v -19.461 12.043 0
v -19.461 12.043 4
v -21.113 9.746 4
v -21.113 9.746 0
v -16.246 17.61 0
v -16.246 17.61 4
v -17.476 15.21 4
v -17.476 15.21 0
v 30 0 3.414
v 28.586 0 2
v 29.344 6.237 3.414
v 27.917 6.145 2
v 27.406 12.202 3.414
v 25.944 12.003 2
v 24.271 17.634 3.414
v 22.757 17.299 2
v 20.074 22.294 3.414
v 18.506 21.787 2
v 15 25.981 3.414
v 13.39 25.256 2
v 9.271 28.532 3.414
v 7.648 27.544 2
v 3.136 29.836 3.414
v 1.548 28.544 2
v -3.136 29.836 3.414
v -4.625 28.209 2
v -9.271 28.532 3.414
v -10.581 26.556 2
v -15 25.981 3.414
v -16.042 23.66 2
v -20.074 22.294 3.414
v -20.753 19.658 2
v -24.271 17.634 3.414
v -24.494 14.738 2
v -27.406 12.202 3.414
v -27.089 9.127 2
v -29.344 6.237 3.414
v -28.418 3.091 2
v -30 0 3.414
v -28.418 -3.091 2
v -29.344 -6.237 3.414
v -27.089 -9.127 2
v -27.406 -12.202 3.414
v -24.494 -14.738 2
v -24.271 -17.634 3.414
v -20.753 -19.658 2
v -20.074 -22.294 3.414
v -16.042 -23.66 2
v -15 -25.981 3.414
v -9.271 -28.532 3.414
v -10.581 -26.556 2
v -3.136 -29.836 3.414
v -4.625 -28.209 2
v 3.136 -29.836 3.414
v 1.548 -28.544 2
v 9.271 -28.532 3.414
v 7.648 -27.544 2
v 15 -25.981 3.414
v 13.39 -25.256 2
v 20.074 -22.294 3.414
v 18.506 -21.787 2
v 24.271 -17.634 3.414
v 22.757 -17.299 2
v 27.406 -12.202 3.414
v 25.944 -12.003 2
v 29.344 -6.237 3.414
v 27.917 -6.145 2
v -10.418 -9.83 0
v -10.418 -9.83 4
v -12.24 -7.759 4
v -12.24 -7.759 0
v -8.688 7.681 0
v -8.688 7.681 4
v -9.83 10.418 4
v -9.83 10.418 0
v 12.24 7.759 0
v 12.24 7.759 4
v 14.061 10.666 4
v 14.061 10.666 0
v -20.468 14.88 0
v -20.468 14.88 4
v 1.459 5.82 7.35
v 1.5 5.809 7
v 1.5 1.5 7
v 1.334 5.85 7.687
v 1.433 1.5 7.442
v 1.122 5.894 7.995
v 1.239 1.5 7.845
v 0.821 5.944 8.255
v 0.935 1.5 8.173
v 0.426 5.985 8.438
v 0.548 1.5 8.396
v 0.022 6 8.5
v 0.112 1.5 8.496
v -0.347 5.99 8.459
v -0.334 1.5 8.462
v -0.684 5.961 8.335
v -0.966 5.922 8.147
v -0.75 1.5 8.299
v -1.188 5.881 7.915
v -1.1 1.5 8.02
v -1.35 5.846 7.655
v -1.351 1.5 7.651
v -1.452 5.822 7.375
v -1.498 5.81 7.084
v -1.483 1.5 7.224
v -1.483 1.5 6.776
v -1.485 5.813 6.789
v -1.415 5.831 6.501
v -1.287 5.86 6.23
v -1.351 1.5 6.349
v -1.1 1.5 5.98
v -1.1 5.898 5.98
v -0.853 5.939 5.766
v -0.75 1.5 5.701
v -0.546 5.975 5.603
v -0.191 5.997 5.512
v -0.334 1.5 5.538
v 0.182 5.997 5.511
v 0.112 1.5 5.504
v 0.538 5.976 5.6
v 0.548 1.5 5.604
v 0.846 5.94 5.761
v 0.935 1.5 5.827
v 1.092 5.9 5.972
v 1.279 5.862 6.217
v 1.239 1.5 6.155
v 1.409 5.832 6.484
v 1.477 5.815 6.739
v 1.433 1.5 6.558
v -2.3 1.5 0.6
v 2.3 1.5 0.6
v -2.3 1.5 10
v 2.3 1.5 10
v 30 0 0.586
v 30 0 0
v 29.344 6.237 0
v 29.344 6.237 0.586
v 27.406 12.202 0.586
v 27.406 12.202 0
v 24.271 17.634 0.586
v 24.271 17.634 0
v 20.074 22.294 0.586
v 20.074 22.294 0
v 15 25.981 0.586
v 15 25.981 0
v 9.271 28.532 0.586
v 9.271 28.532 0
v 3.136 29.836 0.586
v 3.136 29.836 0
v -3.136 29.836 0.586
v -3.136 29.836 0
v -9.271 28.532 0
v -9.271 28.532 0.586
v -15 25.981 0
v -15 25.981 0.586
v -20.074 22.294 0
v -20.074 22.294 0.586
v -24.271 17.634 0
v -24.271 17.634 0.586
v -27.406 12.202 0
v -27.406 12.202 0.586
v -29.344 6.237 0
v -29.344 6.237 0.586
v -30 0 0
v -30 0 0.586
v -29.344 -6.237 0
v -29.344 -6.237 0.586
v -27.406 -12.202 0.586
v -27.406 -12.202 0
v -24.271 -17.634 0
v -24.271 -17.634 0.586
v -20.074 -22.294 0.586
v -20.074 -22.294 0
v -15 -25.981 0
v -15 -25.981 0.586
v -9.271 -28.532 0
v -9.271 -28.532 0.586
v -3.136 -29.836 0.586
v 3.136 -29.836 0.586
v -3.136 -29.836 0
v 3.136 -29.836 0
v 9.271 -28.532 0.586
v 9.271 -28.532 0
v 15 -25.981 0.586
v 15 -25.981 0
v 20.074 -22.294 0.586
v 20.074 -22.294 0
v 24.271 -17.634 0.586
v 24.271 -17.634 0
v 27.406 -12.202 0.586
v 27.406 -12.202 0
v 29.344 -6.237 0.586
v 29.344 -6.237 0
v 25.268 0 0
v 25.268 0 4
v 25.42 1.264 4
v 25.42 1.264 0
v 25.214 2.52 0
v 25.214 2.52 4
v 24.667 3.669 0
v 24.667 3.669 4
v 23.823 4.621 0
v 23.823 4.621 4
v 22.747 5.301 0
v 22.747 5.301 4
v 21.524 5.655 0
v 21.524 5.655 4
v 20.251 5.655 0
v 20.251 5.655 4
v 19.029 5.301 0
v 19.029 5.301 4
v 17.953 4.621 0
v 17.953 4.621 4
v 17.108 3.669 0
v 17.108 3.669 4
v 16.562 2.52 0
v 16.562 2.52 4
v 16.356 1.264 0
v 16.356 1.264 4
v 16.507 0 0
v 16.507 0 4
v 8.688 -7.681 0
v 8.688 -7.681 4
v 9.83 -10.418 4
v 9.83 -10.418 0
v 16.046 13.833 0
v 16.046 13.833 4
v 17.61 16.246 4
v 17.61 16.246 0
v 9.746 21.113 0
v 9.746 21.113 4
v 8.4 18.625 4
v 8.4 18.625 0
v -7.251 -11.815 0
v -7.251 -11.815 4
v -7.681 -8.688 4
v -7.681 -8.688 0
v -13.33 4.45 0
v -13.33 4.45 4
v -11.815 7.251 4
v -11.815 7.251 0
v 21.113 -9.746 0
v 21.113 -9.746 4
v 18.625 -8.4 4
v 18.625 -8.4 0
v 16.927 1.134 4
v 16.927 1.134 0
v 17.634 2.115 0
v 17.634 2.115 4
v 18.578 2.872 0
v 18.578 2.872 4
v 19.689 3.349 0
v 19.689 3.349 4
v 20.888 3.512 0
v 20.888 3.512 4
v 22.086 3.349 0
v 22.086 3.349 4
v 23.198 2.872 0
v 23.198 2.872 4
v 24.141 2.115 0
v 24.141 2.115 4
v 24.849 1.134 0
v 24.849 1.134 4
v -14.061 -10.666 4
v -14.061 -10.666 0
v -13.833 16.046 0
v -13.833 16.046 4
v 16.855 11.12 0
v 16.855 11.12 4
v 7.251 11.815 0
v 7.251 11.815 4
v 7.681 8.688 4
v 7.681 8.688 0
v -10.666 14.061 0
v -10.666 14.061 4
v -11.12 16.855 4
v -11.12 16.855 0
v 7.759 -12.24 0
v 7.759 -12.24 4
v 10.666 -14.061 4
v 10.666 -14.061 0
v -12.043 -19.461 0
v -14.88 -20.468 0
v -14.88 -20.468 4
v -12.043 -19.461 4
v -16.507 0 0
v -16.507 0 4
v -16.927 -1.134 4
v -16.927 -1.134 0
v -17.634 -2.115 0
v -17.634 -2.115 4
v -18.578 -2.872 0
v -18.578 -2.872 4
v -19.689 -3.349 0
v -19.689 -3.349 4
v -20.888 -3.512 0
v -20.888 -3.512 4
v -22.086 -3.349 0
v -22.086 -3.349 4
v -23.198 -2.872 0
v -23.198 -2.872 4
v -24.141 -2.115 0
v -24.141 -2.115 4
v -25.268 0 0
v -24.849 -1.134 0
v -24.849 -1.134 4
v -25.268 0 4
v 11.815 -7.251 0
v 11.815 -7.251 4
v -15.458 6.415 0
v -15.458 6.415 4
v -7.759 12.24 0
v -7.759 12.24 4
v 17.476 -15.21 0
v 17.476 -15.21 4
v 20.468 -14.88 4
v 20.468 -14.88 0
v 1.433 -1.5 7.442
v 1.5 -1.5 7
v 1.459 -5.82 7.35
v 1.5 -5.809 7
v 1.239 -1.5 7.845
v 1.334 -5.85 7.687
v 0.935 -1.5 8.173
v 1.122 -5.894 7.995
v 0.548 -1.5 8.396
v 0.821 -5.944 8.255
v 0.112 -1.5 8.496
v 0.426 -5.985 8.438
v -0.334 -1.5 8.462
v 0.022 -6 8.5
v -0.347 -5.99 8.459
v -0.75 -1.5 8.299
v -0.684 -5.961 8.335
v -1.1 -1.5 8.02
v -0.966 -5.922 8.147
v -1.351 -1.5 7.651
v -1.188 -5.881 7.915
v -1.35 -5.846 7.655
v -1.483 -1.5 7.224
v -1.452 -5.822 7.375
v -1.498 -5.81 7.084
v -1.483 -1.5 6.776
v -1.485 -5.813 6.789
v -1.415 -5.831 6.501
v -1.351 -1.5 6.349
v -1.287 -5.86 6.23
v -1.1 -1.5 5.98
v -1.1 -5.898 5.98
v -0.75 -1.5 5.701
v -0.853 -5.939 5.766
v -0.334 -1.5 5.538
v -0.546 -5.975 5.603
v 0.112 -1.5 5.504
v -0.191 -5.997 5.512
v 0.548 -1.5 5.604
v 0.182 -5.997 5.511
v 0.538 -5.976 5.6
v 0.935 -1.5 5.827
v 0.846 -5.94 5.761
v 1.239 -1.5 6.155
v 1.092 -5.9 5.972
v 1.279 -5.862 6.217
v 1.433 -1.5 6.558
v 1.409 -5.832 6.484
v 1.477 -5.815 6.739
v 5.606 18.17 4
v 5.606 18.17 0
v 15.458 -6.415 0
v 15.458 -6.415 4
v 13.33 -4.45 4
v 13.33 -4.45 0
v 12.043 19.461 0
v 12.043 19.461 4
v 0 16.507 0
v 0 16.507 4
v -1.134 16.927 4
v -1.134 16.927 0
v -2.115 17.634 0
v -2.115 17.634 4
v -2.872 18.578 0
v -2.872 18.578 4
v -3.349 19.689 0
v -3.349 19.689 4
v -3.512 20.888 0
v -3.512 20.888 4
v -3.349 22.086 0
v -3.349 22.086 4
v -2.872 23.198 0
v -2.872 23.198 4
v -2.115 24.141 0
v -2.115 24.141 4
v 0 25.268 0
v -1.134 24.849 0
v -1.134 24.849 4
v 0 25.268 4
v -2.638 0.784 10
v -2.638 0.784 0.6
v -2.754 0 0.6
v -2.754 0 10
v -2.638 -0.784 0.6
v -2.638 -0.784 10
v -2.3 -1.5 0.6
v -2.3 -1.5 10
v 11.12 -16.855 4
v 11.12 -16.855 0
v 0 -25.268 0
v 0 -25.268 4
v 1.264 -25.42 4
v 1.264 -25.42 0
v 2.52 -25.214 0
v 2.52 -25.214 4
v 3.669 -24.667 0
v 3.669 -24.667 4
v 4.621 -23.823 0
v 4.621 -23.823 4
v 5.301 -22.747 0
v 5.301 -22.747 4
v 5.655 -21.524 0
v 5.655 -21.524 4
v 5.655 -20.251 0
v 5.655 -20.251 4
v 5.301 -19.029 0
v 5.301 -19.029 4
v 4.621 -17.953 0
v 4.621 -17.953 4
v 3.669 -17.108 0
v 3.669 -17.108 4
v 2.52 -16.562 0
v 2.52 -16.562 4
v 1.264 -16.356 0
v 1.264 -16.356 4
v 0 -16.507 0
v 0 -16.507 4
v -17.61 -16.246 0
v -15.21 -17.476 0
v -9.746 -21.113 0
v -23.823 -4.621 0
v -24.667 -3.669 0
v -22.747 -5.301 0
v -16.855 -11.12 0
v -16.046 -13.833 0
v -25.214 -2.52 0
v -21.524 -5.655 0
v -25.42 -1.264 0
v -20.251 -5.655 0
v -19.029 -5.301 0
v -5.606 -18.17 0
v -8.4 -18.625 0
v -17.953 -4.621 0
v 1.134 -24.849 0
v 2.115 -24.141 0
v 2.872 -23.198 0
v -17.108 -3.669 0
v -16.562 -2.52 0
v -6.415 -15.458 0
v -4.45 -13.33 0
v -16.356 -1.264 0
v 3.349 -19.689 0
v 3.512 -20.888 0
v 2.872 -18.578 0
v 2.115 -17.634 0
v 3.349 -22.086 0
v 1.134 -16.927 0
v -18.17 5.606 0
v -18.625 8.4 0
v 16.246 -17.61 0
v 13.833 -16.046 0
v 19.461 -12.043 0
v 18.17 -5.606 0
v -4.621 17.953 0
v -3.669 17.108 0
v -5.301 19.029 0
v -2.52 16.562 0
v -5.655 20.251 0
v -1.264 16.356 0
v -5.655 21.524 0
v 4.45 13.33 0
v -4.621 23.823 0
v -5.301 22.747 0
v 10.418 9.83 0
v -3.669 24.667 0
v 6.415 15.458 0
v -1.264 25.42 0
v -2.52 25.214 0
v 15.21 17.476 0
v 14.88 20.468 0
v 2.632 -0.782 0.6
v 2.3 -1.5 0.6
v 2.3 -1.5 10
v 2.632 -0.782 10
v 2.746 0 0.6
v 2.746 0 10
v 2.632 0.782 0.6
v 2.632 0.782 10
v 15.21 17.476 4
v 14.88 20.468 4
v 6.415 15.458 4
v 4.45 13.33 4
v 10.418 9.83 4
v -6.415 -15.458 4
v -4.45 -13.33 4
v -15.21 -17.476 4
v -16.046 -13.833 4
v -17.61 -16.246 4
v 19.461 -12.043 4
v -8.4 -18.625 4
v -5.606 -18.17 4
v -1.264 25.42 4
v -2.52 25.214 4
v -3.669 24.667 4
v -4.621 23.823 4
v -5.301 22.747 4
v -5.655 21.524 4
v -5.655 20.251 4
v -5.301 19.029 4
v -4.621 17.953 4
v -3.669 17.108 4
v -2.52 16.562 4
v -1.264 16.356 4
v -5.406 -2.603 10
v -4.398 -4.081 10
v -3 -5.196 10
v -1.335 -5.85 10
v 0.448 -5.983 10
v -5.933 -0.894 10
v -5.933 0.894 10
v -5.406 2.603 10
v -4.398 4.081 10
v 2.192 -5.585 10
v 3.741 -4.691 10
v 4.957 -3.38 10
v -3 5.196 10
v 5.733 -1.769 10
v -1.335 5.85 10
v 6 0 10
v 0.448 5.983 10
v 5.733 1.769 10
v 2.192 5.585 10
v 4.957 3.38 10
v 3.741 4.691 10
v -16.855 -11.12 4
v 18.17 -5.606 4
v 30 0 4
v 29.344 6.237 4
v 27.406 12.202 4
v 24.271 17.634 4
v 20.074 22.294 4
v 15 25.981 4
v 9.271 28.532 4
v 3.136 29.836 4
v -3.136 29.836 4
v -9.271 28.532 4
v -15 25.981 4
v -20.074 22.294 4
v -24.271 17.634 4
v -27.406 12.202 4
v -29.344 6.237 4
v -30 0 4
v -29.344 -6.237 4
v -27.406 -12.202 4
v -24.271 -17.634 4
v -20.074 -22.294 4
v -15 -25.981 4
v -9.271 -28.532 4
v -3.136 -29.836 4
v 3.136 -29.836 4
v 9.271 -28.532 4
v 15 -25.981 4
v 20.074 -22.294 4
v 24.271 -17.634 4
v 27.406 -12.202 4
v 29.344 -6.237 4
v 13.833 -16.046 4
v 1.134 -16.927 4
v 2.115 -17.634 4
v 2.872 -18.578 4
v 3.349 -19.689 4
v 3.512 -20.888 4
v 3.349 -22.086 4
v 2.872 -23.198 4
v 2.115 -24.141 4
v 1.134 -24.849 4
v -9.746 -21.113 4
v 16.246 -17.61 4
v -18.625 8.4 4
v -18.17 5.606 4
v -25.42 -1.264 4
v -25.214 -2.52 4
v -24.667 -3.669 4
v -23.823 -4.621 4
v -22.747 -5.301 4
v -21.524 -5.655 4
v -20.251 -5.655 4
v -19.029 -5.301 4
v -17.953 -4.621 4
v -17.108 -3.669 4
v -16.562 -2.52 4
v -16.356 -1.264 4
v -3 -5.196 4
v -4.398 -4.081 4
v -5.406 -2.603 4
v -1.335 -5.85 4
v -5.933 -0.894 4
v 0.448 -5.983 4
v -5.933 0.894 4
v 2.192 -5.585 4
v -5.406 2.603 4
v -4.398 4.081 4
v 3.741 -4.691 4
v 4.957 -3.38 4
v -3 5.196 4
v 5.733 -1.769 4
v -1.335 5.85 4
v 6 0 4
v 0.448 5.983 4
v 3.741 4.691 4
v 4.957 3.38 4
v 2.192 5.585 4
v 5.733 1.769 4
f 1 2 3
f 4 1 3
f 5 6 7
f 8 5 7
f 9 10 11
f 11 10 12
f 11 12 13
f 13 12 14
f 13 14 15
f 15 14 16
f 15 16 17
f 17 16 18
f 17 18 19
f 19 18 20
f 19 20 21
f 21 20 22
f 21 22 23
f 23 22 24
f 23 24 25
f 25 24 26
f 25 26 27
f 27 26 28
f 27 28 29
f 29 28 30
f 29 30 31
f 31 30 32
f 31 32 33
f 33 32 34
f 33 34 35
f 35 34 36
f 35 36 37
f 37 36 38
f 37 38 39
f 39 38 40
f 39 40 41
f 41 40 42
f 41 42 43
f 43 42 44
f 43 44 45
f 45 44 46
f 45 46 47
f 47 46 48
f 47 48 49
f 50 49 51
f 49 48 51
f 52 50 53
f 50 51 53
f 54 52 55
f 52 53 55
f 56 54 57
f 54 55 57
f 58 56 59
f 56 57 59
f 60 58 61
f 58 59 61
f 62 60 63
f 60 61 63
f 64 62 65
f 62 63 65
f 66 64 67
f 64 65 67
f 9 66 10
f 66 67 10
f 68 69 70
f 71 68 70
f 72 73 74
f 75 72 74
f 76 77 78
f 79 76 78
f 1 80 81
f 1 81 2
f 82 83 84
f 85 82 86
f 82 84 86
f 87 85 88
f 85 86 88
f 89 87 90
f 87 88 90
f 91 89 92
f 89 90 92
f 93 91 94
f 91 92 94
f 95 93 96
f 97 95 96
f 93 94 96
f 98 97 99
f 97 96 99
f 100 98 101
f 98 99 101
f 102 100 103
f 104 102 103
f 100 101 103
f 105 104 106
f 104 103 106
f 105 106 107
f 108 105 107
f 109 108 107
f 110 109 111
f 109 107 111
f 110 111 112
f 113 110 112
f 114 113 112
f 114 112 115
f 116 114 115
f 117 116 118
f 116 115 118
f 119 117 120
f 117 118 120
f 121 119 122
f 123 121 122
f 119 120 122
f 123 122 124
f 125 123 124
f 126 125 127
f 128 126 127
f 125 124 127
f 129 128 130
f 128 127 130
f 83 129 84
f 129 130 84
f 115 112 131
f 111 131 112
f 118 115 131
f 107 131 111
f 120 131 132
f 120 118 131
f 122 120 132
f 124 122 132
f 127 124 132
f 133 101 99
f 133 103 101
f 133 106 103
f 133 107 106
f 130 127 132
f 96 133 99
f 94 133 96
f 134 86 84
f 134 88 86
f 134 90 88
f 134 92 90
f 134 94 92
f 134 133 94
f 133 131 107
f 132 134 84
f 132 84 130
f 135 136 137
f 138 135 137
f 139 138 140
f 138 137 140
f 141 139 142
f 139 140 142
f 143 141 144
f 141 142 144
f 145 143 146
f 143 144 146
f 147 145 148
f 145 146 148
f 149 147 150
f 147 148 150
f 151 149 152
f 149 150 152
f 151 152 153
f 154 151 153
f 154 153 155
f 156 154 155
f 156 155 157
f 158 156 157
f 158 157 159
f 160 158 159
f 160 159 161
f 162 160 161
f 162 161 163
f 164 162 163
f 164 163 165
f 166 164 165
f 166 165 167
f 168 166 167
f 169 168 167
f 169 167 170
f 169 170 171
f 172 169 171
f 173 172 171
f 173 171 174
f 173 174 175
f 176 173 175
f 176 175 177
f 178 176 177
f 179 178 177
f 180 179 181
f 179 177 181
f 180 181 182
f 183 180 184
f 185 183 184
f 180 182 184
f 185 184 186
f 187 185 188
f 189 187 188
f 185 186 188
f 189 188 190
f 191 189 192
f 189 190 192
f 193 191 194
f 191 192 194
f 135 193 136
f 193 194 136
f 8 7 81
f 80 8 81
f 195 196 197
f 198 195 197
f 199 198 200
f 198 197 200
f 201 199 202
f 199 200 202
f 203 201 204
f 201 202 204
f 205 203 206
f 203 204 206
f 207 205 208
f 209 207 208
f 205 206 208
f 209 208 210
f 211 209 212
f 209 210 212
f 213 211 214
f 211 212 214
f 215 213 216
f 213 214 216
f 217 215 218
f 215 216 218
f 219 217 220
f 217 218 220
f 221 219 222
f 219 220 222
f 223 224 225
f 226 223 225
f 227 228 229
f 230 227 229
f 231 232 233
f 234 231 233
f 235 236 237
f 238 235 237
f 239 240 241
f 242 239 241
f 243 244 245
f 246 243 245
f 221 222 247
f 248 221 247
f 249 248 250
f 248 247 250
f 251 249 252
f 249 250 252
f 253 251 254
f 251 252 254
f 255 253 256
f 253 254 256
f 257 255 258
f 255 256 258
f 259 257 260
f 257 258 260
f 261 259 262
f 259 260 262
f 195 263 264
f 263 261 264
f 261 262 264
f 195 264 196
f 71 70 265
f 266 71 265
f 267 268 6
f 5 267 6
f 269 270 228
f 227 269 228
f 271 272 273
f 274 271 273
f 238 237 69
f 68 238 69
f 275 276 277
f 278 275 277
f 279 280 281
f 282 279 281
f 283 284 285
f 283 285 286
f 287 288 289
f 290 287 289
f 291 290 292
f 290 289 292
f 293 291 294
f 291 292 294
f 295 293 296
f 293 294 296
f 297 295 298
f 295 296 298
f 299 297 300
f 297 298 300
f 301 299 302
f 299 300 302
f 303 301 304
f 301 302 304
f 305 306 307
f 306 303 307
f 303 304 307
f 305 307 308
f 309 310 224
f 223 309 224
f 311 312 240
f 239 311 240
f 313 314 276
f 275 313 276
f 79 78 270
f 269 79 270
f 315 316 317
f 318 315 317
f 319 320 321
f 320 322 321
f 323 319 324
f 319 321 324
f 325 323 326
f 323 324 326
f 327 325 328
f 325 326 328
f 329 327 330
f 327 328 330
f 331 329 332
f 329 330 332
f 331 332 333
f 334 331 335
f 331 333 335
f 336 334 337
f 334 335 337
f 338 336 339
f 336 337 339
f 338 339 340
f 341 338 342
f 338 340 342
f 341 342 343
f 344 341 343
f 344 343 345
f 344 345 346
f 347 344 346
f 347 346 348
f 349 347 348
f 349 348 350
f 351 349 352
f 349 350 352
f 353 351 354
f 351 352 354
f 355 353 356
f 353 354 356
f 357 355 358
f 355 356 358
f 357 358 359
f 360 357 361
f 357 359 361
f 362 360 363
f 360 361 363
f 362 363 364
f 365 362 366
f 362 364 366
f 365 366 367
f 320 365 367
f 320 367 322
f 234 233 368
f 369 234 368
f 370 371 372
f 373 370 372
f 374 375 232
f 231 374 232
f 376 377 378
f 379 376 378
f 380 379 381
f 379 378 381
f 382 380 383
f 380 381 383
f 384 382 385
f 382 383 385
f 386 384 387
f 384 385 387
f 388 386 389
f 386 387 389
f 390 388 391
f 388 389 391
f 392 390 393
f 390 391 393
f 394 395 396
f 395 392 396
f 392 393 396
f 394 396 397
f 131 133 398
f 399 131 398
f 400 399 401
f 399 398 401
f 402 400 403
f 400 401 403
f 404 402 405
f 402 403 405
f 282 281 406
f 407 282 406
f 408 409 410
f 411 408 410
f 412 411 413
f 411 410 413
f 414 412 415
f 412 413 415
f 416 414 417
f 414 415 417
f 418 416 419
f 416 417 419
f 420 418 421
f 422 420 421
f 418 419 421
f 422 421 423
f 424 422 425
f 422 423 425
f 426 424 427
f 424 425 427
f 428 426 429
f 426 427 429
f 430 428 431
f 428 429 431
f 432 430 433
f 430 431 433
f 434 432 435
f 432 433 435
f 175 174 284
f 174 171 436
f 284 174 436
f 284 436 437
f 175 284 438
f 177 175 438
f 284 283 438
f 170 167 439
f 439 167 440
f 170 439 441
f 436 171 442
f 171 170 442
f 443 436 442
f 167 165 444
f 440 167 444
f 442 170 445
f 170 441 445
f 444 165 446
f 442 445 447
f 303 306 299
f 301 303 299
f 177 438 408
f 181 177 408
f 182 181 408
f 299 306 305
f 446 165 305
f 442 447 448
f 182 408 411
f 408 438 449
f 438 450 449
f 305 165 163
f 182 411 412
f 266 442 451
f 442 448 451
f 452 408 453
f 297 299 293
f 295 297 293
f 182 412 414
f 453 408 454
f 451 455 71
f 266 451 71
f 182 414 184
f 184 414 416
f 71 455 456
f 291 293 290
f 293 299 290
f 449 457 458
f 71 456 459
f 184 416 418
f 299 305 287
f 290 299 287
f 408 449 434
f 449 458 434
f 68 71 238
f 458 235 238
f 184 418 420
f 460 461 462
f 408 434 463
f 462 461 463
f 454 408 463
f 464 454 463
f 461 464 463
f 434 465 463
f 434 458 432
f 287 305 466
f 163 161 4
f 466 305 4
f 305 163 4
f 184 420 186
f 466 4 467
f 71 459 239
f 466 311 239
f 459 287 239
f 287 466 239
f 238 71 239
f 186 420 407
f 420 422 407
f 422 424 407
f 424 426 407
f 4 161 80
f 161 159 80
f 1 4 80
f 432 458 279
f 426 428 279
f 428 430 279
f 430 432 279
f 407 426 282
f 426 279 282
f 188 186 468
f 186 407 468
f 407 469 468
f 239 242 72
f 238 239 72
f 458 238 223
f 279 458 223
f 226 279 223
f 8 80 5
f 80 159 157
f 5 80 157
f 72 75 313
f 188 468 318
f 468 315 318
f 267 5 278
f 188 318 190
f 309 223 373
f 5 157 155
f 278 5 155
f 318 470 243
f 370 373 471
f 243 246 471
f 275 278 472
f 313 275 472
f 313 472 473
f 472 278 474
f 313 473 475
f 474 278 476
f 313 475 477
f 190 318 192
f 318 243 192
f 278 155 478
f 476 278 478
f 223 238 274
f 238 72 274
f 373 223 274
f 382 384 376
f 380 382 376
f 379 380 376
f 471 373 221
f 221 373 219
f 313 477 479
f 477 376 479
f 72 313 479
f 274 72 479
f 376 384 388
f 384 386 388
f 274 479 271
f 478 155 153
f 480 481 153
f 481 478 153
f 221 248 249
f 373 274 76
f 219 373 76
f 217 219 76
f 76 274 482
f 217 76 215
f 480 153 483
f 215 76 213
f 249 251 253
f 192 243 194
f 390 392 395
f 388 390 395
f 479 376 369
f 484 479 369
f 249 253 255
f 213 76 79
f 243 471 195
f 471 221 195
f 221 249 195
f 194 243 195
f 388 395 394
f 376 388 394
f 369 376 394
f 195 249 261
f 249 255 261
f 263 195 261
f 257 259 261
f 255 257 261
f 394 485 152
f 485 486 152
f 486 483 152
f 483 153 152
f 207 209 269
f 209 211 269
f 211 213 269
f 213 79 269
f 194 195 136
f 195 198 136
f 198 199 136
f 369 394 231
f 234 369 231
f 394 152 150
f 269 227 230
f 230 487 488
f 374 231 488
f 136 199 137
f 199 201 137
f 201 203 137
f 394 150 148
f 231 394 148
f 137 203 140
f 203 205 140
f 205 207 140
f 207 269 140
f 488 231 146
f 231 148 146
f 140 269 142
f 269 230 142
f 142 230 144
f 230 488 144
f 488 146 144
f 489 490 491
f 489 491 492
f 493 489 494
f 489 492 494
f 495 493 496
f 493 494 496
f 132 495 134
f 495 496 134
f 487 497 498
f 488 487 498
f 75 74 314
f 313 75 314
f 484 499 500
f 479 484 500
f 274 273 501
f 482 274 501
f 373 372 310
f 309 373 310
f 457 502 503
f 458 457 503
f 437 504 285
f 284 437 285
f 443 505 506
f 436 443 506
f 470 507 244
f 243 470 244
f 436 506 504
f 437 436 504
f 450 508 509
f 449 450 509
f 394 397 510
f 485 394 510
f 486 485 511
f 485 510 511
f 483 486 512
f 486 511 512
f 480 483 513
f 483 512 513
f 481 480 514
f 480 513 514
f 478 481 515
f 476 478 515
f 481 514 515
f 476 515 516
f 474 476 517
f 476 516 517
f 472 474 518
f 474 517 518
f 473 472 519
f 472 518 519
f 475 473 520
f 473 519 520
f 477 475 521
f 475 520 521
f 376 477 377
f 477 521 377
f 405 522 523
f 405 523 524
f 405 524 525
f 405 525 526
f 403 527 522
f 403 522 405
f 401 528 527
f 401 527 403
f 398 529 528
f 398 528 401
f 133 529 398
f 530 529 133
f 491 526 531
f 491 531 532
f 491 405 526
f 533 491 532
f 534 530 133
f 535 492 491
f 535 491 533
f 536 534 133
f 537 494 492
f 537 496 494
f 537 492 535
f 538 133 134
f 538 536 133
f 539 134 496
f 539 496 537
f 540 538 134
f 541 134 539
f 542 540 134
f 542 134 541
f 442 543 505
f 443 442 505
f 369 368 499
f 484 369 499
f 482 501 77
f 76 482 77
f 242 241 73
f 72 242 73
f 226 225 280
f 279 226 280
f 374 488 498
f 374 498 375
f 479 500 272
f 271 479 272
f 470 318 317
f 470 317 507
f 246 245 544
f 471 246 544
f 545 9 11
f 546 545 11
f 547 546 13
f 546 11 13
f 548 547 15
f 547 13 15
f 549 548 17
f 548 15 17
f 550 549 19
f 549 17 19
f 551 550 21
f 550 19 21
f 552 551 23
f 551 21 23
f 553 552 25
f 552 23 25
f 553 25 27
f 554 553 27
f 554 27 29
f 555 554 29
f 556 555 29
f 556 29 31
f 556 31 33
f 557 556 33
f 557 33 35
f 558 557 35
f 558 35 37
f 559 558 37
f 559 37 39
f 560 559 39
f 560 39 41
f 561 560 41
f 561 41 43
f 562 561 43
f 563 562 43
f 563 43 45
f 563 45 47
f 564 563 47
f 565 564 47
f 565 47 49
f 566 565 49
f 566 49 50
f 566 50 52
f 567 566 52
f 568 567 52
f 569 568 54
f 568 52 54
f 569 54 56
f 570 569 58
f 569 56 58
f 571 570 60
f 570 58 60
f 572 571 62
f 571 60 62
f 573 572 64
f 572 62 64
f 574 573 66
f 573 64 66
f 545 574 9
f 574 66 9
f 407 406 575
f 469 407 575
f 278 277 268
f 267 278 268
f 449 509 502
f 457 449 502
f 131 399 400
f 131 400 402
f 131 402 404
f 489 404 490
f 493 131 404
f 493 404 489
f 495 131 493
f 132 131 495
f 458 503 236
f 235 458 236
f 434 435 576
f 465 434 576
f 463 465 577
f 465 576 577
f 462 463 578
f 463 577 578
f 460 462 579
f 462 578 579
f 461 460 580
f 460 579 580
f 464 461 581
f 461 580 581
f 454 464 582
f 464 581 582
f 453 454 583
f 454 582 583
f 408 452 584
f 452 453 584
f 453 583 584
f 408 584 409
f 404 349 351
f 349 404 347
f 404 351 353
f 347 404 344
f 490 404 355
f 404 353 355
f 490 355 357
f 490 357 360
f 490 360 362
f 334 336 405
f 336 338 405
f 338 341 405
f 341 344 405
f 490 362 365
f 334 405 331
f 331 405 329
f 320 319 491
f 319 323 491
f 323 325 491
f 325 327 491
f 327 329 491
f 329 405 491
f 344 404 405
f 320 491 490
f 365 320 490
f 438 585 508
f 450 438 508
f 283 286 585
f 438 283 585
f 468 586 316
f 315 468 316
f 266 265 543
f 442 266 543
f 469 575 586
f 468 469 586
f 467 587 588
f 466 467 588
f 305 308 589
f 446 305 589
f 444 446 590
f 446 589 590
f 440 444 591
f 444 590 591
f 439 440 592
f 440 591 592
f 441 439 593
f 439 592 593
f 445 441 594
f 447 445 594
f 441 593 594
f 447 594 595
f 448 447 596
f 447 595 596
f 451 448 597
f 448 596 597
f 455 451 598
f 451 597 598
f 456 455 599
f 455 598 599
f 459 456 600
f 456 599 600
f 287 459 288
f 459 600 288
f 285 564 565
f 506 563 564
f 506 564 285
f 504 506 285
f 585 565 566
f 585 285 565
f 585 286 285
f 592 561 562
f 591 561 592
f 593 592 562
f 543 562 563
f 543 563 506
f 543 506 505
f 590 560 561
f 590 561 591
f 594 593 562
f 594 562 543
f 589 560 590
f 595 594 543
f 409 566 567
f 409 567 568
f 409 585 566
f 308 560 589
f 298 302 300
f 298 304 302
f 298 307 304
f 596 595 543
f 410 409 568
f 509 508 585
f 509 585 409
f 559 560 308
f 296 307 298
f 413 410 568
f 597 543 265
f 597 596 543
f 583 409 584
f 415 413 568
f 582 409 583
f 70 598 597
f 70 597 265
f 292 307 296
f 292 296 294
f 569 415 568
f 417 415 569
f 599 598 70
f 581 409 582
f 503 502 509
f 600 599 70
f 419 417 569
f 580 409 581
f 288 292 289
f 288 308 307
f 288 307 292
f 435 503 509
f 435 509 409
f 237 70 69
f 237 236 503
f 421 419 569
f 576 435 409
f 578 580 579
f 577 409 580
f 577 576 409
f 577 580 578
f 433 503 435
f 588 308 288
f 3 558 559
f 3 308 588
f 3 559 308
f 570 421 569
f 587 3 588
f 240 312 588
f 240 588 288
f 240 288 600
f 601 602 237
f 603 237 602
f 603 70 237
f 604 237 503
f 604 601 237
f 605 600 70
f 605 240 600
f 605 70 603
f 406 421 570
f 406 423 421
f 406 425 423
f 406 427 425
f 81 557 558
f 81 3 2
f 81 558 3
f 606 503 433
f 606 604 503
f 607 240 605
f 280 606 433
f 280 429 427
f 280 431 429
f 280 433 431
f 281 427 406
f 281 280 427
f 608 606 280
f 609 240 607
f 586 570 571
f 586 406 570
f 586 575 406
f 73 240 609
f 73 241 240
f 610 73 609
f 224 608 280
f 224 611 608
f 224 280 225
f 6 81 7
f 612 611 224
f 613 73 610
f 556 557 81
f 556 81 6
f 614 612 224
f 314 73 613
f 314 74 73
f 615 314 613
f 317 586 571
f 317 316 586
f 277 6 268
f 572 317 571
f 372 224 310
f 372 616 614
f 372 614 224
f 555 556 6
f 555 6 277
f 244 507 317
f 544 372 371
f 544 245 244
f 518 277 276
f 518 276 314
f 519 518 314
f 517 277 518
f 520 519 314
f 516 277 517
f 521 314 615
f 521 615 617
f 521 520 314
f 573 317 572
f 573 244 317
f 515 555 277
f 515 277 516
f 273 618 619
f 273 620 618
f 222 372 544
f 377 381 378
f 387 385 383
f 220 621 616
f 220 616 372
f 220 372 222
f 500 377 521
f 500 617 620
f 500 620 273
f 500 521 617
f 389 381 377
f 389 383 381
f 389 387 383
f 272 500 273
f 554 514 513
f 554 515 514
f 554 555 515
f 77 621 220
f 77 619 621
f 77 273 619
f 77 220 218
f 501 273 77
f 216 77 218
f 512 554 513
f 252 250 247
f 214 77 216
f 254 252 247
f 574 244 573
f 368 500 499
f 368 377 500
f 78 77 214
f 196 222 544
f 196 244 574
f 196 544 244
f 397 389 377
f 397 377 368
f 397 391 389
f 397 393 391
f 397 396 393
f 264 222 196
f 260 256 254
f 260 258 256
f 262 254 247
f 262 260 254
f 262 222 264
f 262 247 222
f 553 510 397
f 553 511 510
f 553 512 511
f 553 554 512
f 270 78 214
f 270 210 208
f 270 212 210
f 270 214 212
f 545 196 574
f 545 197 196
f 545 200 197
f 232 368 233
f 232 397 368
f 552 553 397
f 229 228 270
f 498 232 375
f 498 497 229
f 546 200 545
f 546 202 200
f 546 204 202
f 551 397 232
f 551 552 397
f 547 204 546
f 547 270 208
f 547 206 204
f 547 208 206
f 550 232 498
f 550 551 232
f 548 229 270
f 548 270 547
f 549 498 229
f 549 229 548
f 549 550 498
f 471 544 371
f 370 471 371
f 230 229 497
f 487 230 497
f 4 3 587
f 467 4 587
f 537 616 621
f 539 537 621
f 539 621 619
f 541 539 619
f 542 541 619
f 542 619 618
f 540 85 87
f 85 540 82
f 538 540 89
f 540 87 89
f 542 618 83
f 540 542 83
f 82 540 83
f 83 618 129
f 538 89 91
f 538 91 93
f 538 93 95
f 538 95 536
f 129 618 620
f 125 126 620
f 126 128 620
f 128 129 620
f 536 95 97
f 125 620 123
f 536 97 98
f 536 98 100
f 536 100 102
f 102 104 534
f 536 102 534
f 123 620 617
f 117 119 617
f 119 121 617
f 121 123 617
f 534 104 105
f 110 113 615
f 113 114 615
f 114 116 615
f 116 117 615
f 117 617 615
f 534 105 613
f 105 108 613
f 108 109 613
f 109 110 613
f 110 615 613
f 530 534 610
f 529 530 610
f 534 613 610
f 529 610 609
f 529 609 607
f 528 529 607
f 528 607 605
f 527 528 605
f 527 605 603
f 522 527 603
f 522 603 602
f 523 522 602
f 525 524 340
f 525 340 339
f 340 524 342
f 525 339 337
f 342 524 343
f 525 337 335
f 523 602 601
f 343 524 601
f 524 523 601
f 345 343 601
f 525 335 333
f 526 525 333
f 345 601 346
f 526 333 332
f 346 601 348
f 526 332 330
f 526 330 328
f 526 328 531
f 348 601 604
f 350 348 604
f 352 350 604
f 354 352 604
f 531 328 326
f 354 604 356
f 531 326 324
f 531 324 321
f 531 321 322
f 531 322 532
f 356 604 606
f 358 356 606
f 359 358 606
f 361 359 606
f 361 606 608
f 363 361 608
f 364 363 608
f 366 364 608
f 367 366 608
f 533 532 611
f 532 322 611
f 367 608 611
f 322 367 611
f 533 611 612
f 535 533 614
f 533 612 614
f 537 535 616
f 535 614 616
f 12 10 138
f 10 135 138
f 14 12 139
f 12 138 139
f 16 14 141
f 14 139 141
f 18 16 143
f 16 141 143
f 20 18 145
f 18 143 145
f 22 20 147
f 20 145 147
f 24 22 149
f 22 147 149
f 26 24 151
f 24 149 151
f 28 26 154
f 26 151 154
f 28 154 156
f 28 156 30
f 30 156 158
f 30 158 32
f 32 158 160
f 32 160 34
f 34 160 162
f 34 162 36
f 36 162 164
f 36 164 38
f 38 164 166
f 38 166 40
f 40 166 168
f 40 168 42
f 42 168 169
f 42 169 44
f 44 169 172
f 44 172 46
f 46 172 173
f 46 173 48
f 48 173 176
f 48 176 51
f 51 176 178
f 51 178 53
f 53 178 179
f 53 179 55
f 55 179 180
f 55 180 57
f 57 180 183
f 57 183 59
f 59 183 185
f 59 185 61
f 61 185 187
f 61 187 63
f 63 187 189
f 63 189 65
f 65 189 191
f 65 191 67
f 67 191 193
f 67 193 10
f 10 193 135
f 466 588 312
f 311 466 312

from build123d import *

# Parameters (mm, degrees)
F0_R      = 30
F1_DEPTH  = 4
F2_R      = 6
F3_DEPTH  = 6
F4_R      = 1.5
F5_DEPTH  = 9.95
F6_W      = 4.6
F6_H      = 3
F7_DEPTH  = 9.4
F9_DEPTH  = 25
F11_DEPTH = 25


with BuildPart() as f1:
    # F0 (on Top) → F1 (new body)
    with BuildSketch(Plane.XY):
        Circle(F0_R)
    extrude(amount=F1_DEPTH)

    # F2 (on face) → F3 (join)
    with BuildSketch(Plane.XY.offset(4)):
        Circle(F2_R)
    extrude(amount=F3_DEPTH)

    # F4 (on Front) → F5 (cut, symmetric)
    with BuildSketch(Plane.XZ):
        with Locations((0, 7)):
            Circle(F4_R)
    extrude(amount=F5_DEPTH, both=True, mode=Mode.SUBTRACT)

    # F6 (on face) → F7 (cut)
    with BuildSketch(Plane.XY.offset(10)):
        Rectangle(F6_W, F6_H)
        with BuildLine():
            ThreePointArc((2.3, -1.5), (2.7459060435, 0), (2.3, 1.5))
            Line((2.3, 1.5), (2.3, -1.5))
        make_face()
        with BuildLine():
            Line((-2.3, -1.5), (-2.3, 1.5))
            ThreePointArc((-2.3, 1.5), (-2.7540939565, 0), (-2.3, -1.5))
        make_face()
    extrude(amount=-F7_DEPTH, mode=Mode.SUBTRACT)

    # F8 (on face) → F9 (cut)
    with BuildSketch(Plane.XY.offset(4)):
        with BuildLine():
            ThreePointArc((0, 16.5074747056), (-3.5121658528, 20.8878368139), (0, 25.2681989223))
            ThreePointArc((0, 25.2681989223), (-5.6994366386, 20.8878368139), (0, 16.5074747056))
        make_face()
        with BuildLine():
            ThreePointArc((-16.5074747056, 0), (-20.8878368139, -3.5121658528), (-25.2681989223, 0))
            ThreePointArc((-25.2681989223, 0), (-20.8878368139, -5.6994366386), (-16.5074747056, 0))
        make_face()
        with BuildLine():
            ThreePointArc((0, -16.5074747056), (3.5121658528, -20.8878368139), (0, -25.2681989223))
            ThreePointArc((0, -25.2681989223), (5.6994366386, -20.8878368139), (0, -16.5074747056))
        make_face()
        with BuildLine():
            ThreePointArc((16.5074747056, 0), (20.8878368139, 3.5121658528), (25.2681989223, 0))
            ThreePointArc((25.2681989223, 0), (20.8878368139, 5.6994366386), (16.5074747056, 0))
        make_face()
    extrude(amount=-F9_DEPTH, mode=Mode.SUBTRACT)

    # F10 (on face) → F11 (cut)
    with BuildSketch(Plane.XY.offset(4)):
        with BuildLine():
            ThreePointArc((-9.8298114426, 10.4183598849), (-9.7788159618, 10.8230928332), (-9.7617778379, 11.2306698208))
            ThreePointArc((-9.7617778379, 11.2306698208), (-9.9932757594, 12.7164090182), (-10.6658213511, 14.0612862161))
            Line((-10.6658213511, 14.0612862161), (-9.8298114426, 10.4183598849))
        make_face()
        with BuildLine():
            ThreePointArc((-10.6658213511, 14.0612862161), (-9.9932757594, 12.7164090182), (-9.7617778379, 11.2306698208))
            ThreePointArc((-9.7617778379, 11.2306698208), (-9.7788159618, 10.8230928332), (-9.8298114426, 10.4183598849))
            Line((-9.8298114426, 10.4183598849), (-7.759351705, 12.2398230505))
            Line((-7.759351705, 12.2398230505), (-10.6658213511, 14.0612862161))
        make_face()
        with BuildLine():
            Line((-13.8329075388, 16.0460758528), (-10.6658213511, 14.0612862161))
            ThreePointArc((-10.6658213511, 14.0612862161), (-12.0519648423, 15.3686673401), (-13.8329075388, 16.0460758528))
        make_face()
        Polygon((-9.8298114426, 10.4183598849), (-10.6658213511, 14.0612862161), (-13.8329075388, 16.0460758528), (-17.47583387, 15.2100659443), (-19.4606235067, 12.0429797567), (-18.6246135982, 8.4000534254), (-15.4575274105, 6.4152637887), (-11.8146010793, 7.2512736973), align=None)
        with BuildLine():
            ThreePointArc((-13.8329075388, 16.0460758528), (-12.0519648423, 15.3686673401), (-10.6658213511, 14.0612862161))
            Line((-10.6658213511, 14.0612862161), (-11.120263847, 16.8553626042))
            Line((-11.120263847, 16.8553626042), (-13.8329075388, 16.0460758528))
        make_face()
        with BuildLine():
            Line((-8.6883150478, 7.680528209), (-9.8298114426, 10.4183598849))
            ThreePointArc((-9.8298114426, 10.4183598849), (-10.5072199553, 8.6374171884), (-11.8146010793, 7.2512736973))
            Line((-11.8146010793, 7.2512736973), (-8.6883150478, 7.680528209))
        make_face()
        with BuildLine():
            ThreePointArc((-11.8146010793, 7.2512736973), (-10.5072199553, 8.6374171884), (-9.8298114426, 10.4183598849))
            Line((-9.8298114426, 10.4183598849), (-11.8146010793, 7.2512736973))
        make_face()
        with BuildLine():
            Line((-17.47583387, 15.2100659443), (-13.8329075388, 16.0460758528))
            ThreePointArc((-13.8329075388, 16.0460758528), (-15.7375170594, 15.9903824489), (-17.47583387, 15.2100659443))
        make_face()
        with BuildLine():
            ThreePointArc((-17.47583387, 15.2100659443), (-15.7375170594, 15.9903824489), (-13.8329075388, 16.0460758528))
            Line((-13.8329075388, 16.0460758528), (-16.2455738647, 17.609721433))
            Line((-16.2455738647, 17.609721433), (-17.47583387, 15.2100659443))
        make_face()
        with BuildLine():
            Line((-13.3300706432, 4.4496803728), (-11.8146010793, 7.2512736973))
            ThreePointArc((-11.8146010793, 7.2512736973), (-13.5529178899, 6.4709571926), (-15.4575274105, 6.4152637887))
            Line((-15.4575274105, 6.4152637887), (-13.3300706432, 4.4496803728))
        make_face()
        with BuildLine():
            ThreePointArc((-15.4575274105, 6.4152637887), (-13.5529178899, 6.4709571926), (-11.8146010793, 7.2512736973))
            Line((-11.8146010793, 7.2512736973), (-15.4575274105, 6.4152637887))
        make_face()
        with BuildLine():
            Line((-19.4606235067, 12.0429797567), (-17.47583387, 15.2100659443))
            ThreePointArc((-17.47583387, 15.2100659443), (-18.783214994, 13.8239224532), (-19.4606235067, 12.0429797567))
        make_face()
        with BuildLine():
            ThreePointArc((-19.4606235067, 12.0429797567), (-18.783214994, 13.8239224532), (-17.47583387, 15.2100659443))
            Line((-17.47583387, 15.2100659443), (-20.4682286884, 14.8799081511))
            Line((-20.4682286884, 14.8799081511), (-19.4606235067, 12.0429797567))
        make_face()
        with BuildLine():
            Line((-18.1701711023, 5.6059770373), (-15.4575274105, 6.4152637887))
            ThreePointArc((-15.4575274105, 6.4152637887), (-17.2384701071, 7.0926723014), (-18.6246135982, 8.4000534254))
            Line((-18.6246135982, 8.4000534254), (-18.1701711023, 5.6059770373))
        make_face()
        with BuildLine():
            ThreePointArc((-18.6246135982, 8.4000534254), (-17.2384701071, 7.0926723014), (-15.4575274105, 6.4152637887))
            Line((-15.4575274105, 6.4152637887), (-18.6246135982, 8.4000534254))
        make_face()
        with BuildLine():
            Line((-18.6246135982, 8.4000534254), (-19.4606235067, 12.0429797567))
            ThreePointArc((-19.4606235067, 12.0429797567), (-19.4049301028, 10.138370236), (-18.6246135982, 8.4000534254))
        make_face()
        with BuildLine():
            ThreePointArc((-18.6246135982, 8.4000534254), (-19.4049301028, 10.138370236), (-19.4606235067, 12.0429797567))
            Line((-19.4606235067, 12.0429797567), (-21.1133740596, 9.7463018969))
            Line((-21.1133740596, 9.7463018969), (-18.6246135982, 8.4000534254))
        make_face()
        Polygon((-14.8799081511, -20.4682286884), (-12.0429797567, -19.4606235067), (-9.7463018969, -21.1133740596), (-8.4000534254, -18.6246135982), (-5.6059770373, -18.1701711023), (-6.4152637887, -15.4575274105), (-4.4496803728, -13.3300706432), (-7.2512736973, -11.8146010793), (-7.680528209, -8.6883150478), (-10.4183598849, -9.8298114426), (-12.2398230505, -7.759351705), (-14.0612862161, -10.6658213511), (-16.8553626042, -11.120263847), (-16.0460758528, -13.8329075388), (-17.609721433, -16.2455738647), (-15.2100659443, -17.47583387), align=None)
        Polygon((20.4682286884, -14.8799081511), (19.4606235067, -12.0429797567), (21.1133740596, -9.7463018969), (18.6246135982, -8.4000534254), (18.1701711023, -5.6059770373), (15.4575274105, -6.4152637887), (13.3300706432, -4.4496803728), (11.8146010793, -7.2512736973), (8.6883150478, -7.680528209), (9.8298114426, -10.4183598849), (7.759351705, -12.2398230505), (10.6658213511, -14.0612862161), (11.120263847, -16.8553626042), (13.8329075388, -16.0460758528), (16.2455738647, -17.609721433), (17.47583387, -15.2100659443), align=None)
        Polygon((14.8799081511, 20.4682286884), (12.0429797567, 19.4606235067), (9.7463018969, 21.1133740596), (8.4000534254, 18.6246135982), (5.6059770373, 18.1701711023), (6.4152637887, 15.4575274105), (4.4496803728, 13.3300706432), (7.2512736973, 11.8146010793), (7.680528209, 8.6883150478), (10.4183598849, 9.8298114426), (12.2398230505, 7.759351705), (14.0612862161, 10.6658213511), (16.8553626042, 11.120263847), (16.0460758528, 13.8329075388), (17.609721433, 16.2455738647), (15.2100659443, 17.47583387), align=None)
    extrude(amount=-F11_DEPTH, mode=Mode.SUBTRACT)

    # F12 (on Front) → F13 (revolve, cut)
    with BuildSketch(Plane.XZ):
        Polygon((30, 0.5857864376), (30, 3.4142135624), (28.5857864376, 2), align=None)
    revolve(axis=Axis((0, 0, 3.4037481528), (0, 0, 1)), mode=Mode.SUBTRACT)


solid = f1.part
